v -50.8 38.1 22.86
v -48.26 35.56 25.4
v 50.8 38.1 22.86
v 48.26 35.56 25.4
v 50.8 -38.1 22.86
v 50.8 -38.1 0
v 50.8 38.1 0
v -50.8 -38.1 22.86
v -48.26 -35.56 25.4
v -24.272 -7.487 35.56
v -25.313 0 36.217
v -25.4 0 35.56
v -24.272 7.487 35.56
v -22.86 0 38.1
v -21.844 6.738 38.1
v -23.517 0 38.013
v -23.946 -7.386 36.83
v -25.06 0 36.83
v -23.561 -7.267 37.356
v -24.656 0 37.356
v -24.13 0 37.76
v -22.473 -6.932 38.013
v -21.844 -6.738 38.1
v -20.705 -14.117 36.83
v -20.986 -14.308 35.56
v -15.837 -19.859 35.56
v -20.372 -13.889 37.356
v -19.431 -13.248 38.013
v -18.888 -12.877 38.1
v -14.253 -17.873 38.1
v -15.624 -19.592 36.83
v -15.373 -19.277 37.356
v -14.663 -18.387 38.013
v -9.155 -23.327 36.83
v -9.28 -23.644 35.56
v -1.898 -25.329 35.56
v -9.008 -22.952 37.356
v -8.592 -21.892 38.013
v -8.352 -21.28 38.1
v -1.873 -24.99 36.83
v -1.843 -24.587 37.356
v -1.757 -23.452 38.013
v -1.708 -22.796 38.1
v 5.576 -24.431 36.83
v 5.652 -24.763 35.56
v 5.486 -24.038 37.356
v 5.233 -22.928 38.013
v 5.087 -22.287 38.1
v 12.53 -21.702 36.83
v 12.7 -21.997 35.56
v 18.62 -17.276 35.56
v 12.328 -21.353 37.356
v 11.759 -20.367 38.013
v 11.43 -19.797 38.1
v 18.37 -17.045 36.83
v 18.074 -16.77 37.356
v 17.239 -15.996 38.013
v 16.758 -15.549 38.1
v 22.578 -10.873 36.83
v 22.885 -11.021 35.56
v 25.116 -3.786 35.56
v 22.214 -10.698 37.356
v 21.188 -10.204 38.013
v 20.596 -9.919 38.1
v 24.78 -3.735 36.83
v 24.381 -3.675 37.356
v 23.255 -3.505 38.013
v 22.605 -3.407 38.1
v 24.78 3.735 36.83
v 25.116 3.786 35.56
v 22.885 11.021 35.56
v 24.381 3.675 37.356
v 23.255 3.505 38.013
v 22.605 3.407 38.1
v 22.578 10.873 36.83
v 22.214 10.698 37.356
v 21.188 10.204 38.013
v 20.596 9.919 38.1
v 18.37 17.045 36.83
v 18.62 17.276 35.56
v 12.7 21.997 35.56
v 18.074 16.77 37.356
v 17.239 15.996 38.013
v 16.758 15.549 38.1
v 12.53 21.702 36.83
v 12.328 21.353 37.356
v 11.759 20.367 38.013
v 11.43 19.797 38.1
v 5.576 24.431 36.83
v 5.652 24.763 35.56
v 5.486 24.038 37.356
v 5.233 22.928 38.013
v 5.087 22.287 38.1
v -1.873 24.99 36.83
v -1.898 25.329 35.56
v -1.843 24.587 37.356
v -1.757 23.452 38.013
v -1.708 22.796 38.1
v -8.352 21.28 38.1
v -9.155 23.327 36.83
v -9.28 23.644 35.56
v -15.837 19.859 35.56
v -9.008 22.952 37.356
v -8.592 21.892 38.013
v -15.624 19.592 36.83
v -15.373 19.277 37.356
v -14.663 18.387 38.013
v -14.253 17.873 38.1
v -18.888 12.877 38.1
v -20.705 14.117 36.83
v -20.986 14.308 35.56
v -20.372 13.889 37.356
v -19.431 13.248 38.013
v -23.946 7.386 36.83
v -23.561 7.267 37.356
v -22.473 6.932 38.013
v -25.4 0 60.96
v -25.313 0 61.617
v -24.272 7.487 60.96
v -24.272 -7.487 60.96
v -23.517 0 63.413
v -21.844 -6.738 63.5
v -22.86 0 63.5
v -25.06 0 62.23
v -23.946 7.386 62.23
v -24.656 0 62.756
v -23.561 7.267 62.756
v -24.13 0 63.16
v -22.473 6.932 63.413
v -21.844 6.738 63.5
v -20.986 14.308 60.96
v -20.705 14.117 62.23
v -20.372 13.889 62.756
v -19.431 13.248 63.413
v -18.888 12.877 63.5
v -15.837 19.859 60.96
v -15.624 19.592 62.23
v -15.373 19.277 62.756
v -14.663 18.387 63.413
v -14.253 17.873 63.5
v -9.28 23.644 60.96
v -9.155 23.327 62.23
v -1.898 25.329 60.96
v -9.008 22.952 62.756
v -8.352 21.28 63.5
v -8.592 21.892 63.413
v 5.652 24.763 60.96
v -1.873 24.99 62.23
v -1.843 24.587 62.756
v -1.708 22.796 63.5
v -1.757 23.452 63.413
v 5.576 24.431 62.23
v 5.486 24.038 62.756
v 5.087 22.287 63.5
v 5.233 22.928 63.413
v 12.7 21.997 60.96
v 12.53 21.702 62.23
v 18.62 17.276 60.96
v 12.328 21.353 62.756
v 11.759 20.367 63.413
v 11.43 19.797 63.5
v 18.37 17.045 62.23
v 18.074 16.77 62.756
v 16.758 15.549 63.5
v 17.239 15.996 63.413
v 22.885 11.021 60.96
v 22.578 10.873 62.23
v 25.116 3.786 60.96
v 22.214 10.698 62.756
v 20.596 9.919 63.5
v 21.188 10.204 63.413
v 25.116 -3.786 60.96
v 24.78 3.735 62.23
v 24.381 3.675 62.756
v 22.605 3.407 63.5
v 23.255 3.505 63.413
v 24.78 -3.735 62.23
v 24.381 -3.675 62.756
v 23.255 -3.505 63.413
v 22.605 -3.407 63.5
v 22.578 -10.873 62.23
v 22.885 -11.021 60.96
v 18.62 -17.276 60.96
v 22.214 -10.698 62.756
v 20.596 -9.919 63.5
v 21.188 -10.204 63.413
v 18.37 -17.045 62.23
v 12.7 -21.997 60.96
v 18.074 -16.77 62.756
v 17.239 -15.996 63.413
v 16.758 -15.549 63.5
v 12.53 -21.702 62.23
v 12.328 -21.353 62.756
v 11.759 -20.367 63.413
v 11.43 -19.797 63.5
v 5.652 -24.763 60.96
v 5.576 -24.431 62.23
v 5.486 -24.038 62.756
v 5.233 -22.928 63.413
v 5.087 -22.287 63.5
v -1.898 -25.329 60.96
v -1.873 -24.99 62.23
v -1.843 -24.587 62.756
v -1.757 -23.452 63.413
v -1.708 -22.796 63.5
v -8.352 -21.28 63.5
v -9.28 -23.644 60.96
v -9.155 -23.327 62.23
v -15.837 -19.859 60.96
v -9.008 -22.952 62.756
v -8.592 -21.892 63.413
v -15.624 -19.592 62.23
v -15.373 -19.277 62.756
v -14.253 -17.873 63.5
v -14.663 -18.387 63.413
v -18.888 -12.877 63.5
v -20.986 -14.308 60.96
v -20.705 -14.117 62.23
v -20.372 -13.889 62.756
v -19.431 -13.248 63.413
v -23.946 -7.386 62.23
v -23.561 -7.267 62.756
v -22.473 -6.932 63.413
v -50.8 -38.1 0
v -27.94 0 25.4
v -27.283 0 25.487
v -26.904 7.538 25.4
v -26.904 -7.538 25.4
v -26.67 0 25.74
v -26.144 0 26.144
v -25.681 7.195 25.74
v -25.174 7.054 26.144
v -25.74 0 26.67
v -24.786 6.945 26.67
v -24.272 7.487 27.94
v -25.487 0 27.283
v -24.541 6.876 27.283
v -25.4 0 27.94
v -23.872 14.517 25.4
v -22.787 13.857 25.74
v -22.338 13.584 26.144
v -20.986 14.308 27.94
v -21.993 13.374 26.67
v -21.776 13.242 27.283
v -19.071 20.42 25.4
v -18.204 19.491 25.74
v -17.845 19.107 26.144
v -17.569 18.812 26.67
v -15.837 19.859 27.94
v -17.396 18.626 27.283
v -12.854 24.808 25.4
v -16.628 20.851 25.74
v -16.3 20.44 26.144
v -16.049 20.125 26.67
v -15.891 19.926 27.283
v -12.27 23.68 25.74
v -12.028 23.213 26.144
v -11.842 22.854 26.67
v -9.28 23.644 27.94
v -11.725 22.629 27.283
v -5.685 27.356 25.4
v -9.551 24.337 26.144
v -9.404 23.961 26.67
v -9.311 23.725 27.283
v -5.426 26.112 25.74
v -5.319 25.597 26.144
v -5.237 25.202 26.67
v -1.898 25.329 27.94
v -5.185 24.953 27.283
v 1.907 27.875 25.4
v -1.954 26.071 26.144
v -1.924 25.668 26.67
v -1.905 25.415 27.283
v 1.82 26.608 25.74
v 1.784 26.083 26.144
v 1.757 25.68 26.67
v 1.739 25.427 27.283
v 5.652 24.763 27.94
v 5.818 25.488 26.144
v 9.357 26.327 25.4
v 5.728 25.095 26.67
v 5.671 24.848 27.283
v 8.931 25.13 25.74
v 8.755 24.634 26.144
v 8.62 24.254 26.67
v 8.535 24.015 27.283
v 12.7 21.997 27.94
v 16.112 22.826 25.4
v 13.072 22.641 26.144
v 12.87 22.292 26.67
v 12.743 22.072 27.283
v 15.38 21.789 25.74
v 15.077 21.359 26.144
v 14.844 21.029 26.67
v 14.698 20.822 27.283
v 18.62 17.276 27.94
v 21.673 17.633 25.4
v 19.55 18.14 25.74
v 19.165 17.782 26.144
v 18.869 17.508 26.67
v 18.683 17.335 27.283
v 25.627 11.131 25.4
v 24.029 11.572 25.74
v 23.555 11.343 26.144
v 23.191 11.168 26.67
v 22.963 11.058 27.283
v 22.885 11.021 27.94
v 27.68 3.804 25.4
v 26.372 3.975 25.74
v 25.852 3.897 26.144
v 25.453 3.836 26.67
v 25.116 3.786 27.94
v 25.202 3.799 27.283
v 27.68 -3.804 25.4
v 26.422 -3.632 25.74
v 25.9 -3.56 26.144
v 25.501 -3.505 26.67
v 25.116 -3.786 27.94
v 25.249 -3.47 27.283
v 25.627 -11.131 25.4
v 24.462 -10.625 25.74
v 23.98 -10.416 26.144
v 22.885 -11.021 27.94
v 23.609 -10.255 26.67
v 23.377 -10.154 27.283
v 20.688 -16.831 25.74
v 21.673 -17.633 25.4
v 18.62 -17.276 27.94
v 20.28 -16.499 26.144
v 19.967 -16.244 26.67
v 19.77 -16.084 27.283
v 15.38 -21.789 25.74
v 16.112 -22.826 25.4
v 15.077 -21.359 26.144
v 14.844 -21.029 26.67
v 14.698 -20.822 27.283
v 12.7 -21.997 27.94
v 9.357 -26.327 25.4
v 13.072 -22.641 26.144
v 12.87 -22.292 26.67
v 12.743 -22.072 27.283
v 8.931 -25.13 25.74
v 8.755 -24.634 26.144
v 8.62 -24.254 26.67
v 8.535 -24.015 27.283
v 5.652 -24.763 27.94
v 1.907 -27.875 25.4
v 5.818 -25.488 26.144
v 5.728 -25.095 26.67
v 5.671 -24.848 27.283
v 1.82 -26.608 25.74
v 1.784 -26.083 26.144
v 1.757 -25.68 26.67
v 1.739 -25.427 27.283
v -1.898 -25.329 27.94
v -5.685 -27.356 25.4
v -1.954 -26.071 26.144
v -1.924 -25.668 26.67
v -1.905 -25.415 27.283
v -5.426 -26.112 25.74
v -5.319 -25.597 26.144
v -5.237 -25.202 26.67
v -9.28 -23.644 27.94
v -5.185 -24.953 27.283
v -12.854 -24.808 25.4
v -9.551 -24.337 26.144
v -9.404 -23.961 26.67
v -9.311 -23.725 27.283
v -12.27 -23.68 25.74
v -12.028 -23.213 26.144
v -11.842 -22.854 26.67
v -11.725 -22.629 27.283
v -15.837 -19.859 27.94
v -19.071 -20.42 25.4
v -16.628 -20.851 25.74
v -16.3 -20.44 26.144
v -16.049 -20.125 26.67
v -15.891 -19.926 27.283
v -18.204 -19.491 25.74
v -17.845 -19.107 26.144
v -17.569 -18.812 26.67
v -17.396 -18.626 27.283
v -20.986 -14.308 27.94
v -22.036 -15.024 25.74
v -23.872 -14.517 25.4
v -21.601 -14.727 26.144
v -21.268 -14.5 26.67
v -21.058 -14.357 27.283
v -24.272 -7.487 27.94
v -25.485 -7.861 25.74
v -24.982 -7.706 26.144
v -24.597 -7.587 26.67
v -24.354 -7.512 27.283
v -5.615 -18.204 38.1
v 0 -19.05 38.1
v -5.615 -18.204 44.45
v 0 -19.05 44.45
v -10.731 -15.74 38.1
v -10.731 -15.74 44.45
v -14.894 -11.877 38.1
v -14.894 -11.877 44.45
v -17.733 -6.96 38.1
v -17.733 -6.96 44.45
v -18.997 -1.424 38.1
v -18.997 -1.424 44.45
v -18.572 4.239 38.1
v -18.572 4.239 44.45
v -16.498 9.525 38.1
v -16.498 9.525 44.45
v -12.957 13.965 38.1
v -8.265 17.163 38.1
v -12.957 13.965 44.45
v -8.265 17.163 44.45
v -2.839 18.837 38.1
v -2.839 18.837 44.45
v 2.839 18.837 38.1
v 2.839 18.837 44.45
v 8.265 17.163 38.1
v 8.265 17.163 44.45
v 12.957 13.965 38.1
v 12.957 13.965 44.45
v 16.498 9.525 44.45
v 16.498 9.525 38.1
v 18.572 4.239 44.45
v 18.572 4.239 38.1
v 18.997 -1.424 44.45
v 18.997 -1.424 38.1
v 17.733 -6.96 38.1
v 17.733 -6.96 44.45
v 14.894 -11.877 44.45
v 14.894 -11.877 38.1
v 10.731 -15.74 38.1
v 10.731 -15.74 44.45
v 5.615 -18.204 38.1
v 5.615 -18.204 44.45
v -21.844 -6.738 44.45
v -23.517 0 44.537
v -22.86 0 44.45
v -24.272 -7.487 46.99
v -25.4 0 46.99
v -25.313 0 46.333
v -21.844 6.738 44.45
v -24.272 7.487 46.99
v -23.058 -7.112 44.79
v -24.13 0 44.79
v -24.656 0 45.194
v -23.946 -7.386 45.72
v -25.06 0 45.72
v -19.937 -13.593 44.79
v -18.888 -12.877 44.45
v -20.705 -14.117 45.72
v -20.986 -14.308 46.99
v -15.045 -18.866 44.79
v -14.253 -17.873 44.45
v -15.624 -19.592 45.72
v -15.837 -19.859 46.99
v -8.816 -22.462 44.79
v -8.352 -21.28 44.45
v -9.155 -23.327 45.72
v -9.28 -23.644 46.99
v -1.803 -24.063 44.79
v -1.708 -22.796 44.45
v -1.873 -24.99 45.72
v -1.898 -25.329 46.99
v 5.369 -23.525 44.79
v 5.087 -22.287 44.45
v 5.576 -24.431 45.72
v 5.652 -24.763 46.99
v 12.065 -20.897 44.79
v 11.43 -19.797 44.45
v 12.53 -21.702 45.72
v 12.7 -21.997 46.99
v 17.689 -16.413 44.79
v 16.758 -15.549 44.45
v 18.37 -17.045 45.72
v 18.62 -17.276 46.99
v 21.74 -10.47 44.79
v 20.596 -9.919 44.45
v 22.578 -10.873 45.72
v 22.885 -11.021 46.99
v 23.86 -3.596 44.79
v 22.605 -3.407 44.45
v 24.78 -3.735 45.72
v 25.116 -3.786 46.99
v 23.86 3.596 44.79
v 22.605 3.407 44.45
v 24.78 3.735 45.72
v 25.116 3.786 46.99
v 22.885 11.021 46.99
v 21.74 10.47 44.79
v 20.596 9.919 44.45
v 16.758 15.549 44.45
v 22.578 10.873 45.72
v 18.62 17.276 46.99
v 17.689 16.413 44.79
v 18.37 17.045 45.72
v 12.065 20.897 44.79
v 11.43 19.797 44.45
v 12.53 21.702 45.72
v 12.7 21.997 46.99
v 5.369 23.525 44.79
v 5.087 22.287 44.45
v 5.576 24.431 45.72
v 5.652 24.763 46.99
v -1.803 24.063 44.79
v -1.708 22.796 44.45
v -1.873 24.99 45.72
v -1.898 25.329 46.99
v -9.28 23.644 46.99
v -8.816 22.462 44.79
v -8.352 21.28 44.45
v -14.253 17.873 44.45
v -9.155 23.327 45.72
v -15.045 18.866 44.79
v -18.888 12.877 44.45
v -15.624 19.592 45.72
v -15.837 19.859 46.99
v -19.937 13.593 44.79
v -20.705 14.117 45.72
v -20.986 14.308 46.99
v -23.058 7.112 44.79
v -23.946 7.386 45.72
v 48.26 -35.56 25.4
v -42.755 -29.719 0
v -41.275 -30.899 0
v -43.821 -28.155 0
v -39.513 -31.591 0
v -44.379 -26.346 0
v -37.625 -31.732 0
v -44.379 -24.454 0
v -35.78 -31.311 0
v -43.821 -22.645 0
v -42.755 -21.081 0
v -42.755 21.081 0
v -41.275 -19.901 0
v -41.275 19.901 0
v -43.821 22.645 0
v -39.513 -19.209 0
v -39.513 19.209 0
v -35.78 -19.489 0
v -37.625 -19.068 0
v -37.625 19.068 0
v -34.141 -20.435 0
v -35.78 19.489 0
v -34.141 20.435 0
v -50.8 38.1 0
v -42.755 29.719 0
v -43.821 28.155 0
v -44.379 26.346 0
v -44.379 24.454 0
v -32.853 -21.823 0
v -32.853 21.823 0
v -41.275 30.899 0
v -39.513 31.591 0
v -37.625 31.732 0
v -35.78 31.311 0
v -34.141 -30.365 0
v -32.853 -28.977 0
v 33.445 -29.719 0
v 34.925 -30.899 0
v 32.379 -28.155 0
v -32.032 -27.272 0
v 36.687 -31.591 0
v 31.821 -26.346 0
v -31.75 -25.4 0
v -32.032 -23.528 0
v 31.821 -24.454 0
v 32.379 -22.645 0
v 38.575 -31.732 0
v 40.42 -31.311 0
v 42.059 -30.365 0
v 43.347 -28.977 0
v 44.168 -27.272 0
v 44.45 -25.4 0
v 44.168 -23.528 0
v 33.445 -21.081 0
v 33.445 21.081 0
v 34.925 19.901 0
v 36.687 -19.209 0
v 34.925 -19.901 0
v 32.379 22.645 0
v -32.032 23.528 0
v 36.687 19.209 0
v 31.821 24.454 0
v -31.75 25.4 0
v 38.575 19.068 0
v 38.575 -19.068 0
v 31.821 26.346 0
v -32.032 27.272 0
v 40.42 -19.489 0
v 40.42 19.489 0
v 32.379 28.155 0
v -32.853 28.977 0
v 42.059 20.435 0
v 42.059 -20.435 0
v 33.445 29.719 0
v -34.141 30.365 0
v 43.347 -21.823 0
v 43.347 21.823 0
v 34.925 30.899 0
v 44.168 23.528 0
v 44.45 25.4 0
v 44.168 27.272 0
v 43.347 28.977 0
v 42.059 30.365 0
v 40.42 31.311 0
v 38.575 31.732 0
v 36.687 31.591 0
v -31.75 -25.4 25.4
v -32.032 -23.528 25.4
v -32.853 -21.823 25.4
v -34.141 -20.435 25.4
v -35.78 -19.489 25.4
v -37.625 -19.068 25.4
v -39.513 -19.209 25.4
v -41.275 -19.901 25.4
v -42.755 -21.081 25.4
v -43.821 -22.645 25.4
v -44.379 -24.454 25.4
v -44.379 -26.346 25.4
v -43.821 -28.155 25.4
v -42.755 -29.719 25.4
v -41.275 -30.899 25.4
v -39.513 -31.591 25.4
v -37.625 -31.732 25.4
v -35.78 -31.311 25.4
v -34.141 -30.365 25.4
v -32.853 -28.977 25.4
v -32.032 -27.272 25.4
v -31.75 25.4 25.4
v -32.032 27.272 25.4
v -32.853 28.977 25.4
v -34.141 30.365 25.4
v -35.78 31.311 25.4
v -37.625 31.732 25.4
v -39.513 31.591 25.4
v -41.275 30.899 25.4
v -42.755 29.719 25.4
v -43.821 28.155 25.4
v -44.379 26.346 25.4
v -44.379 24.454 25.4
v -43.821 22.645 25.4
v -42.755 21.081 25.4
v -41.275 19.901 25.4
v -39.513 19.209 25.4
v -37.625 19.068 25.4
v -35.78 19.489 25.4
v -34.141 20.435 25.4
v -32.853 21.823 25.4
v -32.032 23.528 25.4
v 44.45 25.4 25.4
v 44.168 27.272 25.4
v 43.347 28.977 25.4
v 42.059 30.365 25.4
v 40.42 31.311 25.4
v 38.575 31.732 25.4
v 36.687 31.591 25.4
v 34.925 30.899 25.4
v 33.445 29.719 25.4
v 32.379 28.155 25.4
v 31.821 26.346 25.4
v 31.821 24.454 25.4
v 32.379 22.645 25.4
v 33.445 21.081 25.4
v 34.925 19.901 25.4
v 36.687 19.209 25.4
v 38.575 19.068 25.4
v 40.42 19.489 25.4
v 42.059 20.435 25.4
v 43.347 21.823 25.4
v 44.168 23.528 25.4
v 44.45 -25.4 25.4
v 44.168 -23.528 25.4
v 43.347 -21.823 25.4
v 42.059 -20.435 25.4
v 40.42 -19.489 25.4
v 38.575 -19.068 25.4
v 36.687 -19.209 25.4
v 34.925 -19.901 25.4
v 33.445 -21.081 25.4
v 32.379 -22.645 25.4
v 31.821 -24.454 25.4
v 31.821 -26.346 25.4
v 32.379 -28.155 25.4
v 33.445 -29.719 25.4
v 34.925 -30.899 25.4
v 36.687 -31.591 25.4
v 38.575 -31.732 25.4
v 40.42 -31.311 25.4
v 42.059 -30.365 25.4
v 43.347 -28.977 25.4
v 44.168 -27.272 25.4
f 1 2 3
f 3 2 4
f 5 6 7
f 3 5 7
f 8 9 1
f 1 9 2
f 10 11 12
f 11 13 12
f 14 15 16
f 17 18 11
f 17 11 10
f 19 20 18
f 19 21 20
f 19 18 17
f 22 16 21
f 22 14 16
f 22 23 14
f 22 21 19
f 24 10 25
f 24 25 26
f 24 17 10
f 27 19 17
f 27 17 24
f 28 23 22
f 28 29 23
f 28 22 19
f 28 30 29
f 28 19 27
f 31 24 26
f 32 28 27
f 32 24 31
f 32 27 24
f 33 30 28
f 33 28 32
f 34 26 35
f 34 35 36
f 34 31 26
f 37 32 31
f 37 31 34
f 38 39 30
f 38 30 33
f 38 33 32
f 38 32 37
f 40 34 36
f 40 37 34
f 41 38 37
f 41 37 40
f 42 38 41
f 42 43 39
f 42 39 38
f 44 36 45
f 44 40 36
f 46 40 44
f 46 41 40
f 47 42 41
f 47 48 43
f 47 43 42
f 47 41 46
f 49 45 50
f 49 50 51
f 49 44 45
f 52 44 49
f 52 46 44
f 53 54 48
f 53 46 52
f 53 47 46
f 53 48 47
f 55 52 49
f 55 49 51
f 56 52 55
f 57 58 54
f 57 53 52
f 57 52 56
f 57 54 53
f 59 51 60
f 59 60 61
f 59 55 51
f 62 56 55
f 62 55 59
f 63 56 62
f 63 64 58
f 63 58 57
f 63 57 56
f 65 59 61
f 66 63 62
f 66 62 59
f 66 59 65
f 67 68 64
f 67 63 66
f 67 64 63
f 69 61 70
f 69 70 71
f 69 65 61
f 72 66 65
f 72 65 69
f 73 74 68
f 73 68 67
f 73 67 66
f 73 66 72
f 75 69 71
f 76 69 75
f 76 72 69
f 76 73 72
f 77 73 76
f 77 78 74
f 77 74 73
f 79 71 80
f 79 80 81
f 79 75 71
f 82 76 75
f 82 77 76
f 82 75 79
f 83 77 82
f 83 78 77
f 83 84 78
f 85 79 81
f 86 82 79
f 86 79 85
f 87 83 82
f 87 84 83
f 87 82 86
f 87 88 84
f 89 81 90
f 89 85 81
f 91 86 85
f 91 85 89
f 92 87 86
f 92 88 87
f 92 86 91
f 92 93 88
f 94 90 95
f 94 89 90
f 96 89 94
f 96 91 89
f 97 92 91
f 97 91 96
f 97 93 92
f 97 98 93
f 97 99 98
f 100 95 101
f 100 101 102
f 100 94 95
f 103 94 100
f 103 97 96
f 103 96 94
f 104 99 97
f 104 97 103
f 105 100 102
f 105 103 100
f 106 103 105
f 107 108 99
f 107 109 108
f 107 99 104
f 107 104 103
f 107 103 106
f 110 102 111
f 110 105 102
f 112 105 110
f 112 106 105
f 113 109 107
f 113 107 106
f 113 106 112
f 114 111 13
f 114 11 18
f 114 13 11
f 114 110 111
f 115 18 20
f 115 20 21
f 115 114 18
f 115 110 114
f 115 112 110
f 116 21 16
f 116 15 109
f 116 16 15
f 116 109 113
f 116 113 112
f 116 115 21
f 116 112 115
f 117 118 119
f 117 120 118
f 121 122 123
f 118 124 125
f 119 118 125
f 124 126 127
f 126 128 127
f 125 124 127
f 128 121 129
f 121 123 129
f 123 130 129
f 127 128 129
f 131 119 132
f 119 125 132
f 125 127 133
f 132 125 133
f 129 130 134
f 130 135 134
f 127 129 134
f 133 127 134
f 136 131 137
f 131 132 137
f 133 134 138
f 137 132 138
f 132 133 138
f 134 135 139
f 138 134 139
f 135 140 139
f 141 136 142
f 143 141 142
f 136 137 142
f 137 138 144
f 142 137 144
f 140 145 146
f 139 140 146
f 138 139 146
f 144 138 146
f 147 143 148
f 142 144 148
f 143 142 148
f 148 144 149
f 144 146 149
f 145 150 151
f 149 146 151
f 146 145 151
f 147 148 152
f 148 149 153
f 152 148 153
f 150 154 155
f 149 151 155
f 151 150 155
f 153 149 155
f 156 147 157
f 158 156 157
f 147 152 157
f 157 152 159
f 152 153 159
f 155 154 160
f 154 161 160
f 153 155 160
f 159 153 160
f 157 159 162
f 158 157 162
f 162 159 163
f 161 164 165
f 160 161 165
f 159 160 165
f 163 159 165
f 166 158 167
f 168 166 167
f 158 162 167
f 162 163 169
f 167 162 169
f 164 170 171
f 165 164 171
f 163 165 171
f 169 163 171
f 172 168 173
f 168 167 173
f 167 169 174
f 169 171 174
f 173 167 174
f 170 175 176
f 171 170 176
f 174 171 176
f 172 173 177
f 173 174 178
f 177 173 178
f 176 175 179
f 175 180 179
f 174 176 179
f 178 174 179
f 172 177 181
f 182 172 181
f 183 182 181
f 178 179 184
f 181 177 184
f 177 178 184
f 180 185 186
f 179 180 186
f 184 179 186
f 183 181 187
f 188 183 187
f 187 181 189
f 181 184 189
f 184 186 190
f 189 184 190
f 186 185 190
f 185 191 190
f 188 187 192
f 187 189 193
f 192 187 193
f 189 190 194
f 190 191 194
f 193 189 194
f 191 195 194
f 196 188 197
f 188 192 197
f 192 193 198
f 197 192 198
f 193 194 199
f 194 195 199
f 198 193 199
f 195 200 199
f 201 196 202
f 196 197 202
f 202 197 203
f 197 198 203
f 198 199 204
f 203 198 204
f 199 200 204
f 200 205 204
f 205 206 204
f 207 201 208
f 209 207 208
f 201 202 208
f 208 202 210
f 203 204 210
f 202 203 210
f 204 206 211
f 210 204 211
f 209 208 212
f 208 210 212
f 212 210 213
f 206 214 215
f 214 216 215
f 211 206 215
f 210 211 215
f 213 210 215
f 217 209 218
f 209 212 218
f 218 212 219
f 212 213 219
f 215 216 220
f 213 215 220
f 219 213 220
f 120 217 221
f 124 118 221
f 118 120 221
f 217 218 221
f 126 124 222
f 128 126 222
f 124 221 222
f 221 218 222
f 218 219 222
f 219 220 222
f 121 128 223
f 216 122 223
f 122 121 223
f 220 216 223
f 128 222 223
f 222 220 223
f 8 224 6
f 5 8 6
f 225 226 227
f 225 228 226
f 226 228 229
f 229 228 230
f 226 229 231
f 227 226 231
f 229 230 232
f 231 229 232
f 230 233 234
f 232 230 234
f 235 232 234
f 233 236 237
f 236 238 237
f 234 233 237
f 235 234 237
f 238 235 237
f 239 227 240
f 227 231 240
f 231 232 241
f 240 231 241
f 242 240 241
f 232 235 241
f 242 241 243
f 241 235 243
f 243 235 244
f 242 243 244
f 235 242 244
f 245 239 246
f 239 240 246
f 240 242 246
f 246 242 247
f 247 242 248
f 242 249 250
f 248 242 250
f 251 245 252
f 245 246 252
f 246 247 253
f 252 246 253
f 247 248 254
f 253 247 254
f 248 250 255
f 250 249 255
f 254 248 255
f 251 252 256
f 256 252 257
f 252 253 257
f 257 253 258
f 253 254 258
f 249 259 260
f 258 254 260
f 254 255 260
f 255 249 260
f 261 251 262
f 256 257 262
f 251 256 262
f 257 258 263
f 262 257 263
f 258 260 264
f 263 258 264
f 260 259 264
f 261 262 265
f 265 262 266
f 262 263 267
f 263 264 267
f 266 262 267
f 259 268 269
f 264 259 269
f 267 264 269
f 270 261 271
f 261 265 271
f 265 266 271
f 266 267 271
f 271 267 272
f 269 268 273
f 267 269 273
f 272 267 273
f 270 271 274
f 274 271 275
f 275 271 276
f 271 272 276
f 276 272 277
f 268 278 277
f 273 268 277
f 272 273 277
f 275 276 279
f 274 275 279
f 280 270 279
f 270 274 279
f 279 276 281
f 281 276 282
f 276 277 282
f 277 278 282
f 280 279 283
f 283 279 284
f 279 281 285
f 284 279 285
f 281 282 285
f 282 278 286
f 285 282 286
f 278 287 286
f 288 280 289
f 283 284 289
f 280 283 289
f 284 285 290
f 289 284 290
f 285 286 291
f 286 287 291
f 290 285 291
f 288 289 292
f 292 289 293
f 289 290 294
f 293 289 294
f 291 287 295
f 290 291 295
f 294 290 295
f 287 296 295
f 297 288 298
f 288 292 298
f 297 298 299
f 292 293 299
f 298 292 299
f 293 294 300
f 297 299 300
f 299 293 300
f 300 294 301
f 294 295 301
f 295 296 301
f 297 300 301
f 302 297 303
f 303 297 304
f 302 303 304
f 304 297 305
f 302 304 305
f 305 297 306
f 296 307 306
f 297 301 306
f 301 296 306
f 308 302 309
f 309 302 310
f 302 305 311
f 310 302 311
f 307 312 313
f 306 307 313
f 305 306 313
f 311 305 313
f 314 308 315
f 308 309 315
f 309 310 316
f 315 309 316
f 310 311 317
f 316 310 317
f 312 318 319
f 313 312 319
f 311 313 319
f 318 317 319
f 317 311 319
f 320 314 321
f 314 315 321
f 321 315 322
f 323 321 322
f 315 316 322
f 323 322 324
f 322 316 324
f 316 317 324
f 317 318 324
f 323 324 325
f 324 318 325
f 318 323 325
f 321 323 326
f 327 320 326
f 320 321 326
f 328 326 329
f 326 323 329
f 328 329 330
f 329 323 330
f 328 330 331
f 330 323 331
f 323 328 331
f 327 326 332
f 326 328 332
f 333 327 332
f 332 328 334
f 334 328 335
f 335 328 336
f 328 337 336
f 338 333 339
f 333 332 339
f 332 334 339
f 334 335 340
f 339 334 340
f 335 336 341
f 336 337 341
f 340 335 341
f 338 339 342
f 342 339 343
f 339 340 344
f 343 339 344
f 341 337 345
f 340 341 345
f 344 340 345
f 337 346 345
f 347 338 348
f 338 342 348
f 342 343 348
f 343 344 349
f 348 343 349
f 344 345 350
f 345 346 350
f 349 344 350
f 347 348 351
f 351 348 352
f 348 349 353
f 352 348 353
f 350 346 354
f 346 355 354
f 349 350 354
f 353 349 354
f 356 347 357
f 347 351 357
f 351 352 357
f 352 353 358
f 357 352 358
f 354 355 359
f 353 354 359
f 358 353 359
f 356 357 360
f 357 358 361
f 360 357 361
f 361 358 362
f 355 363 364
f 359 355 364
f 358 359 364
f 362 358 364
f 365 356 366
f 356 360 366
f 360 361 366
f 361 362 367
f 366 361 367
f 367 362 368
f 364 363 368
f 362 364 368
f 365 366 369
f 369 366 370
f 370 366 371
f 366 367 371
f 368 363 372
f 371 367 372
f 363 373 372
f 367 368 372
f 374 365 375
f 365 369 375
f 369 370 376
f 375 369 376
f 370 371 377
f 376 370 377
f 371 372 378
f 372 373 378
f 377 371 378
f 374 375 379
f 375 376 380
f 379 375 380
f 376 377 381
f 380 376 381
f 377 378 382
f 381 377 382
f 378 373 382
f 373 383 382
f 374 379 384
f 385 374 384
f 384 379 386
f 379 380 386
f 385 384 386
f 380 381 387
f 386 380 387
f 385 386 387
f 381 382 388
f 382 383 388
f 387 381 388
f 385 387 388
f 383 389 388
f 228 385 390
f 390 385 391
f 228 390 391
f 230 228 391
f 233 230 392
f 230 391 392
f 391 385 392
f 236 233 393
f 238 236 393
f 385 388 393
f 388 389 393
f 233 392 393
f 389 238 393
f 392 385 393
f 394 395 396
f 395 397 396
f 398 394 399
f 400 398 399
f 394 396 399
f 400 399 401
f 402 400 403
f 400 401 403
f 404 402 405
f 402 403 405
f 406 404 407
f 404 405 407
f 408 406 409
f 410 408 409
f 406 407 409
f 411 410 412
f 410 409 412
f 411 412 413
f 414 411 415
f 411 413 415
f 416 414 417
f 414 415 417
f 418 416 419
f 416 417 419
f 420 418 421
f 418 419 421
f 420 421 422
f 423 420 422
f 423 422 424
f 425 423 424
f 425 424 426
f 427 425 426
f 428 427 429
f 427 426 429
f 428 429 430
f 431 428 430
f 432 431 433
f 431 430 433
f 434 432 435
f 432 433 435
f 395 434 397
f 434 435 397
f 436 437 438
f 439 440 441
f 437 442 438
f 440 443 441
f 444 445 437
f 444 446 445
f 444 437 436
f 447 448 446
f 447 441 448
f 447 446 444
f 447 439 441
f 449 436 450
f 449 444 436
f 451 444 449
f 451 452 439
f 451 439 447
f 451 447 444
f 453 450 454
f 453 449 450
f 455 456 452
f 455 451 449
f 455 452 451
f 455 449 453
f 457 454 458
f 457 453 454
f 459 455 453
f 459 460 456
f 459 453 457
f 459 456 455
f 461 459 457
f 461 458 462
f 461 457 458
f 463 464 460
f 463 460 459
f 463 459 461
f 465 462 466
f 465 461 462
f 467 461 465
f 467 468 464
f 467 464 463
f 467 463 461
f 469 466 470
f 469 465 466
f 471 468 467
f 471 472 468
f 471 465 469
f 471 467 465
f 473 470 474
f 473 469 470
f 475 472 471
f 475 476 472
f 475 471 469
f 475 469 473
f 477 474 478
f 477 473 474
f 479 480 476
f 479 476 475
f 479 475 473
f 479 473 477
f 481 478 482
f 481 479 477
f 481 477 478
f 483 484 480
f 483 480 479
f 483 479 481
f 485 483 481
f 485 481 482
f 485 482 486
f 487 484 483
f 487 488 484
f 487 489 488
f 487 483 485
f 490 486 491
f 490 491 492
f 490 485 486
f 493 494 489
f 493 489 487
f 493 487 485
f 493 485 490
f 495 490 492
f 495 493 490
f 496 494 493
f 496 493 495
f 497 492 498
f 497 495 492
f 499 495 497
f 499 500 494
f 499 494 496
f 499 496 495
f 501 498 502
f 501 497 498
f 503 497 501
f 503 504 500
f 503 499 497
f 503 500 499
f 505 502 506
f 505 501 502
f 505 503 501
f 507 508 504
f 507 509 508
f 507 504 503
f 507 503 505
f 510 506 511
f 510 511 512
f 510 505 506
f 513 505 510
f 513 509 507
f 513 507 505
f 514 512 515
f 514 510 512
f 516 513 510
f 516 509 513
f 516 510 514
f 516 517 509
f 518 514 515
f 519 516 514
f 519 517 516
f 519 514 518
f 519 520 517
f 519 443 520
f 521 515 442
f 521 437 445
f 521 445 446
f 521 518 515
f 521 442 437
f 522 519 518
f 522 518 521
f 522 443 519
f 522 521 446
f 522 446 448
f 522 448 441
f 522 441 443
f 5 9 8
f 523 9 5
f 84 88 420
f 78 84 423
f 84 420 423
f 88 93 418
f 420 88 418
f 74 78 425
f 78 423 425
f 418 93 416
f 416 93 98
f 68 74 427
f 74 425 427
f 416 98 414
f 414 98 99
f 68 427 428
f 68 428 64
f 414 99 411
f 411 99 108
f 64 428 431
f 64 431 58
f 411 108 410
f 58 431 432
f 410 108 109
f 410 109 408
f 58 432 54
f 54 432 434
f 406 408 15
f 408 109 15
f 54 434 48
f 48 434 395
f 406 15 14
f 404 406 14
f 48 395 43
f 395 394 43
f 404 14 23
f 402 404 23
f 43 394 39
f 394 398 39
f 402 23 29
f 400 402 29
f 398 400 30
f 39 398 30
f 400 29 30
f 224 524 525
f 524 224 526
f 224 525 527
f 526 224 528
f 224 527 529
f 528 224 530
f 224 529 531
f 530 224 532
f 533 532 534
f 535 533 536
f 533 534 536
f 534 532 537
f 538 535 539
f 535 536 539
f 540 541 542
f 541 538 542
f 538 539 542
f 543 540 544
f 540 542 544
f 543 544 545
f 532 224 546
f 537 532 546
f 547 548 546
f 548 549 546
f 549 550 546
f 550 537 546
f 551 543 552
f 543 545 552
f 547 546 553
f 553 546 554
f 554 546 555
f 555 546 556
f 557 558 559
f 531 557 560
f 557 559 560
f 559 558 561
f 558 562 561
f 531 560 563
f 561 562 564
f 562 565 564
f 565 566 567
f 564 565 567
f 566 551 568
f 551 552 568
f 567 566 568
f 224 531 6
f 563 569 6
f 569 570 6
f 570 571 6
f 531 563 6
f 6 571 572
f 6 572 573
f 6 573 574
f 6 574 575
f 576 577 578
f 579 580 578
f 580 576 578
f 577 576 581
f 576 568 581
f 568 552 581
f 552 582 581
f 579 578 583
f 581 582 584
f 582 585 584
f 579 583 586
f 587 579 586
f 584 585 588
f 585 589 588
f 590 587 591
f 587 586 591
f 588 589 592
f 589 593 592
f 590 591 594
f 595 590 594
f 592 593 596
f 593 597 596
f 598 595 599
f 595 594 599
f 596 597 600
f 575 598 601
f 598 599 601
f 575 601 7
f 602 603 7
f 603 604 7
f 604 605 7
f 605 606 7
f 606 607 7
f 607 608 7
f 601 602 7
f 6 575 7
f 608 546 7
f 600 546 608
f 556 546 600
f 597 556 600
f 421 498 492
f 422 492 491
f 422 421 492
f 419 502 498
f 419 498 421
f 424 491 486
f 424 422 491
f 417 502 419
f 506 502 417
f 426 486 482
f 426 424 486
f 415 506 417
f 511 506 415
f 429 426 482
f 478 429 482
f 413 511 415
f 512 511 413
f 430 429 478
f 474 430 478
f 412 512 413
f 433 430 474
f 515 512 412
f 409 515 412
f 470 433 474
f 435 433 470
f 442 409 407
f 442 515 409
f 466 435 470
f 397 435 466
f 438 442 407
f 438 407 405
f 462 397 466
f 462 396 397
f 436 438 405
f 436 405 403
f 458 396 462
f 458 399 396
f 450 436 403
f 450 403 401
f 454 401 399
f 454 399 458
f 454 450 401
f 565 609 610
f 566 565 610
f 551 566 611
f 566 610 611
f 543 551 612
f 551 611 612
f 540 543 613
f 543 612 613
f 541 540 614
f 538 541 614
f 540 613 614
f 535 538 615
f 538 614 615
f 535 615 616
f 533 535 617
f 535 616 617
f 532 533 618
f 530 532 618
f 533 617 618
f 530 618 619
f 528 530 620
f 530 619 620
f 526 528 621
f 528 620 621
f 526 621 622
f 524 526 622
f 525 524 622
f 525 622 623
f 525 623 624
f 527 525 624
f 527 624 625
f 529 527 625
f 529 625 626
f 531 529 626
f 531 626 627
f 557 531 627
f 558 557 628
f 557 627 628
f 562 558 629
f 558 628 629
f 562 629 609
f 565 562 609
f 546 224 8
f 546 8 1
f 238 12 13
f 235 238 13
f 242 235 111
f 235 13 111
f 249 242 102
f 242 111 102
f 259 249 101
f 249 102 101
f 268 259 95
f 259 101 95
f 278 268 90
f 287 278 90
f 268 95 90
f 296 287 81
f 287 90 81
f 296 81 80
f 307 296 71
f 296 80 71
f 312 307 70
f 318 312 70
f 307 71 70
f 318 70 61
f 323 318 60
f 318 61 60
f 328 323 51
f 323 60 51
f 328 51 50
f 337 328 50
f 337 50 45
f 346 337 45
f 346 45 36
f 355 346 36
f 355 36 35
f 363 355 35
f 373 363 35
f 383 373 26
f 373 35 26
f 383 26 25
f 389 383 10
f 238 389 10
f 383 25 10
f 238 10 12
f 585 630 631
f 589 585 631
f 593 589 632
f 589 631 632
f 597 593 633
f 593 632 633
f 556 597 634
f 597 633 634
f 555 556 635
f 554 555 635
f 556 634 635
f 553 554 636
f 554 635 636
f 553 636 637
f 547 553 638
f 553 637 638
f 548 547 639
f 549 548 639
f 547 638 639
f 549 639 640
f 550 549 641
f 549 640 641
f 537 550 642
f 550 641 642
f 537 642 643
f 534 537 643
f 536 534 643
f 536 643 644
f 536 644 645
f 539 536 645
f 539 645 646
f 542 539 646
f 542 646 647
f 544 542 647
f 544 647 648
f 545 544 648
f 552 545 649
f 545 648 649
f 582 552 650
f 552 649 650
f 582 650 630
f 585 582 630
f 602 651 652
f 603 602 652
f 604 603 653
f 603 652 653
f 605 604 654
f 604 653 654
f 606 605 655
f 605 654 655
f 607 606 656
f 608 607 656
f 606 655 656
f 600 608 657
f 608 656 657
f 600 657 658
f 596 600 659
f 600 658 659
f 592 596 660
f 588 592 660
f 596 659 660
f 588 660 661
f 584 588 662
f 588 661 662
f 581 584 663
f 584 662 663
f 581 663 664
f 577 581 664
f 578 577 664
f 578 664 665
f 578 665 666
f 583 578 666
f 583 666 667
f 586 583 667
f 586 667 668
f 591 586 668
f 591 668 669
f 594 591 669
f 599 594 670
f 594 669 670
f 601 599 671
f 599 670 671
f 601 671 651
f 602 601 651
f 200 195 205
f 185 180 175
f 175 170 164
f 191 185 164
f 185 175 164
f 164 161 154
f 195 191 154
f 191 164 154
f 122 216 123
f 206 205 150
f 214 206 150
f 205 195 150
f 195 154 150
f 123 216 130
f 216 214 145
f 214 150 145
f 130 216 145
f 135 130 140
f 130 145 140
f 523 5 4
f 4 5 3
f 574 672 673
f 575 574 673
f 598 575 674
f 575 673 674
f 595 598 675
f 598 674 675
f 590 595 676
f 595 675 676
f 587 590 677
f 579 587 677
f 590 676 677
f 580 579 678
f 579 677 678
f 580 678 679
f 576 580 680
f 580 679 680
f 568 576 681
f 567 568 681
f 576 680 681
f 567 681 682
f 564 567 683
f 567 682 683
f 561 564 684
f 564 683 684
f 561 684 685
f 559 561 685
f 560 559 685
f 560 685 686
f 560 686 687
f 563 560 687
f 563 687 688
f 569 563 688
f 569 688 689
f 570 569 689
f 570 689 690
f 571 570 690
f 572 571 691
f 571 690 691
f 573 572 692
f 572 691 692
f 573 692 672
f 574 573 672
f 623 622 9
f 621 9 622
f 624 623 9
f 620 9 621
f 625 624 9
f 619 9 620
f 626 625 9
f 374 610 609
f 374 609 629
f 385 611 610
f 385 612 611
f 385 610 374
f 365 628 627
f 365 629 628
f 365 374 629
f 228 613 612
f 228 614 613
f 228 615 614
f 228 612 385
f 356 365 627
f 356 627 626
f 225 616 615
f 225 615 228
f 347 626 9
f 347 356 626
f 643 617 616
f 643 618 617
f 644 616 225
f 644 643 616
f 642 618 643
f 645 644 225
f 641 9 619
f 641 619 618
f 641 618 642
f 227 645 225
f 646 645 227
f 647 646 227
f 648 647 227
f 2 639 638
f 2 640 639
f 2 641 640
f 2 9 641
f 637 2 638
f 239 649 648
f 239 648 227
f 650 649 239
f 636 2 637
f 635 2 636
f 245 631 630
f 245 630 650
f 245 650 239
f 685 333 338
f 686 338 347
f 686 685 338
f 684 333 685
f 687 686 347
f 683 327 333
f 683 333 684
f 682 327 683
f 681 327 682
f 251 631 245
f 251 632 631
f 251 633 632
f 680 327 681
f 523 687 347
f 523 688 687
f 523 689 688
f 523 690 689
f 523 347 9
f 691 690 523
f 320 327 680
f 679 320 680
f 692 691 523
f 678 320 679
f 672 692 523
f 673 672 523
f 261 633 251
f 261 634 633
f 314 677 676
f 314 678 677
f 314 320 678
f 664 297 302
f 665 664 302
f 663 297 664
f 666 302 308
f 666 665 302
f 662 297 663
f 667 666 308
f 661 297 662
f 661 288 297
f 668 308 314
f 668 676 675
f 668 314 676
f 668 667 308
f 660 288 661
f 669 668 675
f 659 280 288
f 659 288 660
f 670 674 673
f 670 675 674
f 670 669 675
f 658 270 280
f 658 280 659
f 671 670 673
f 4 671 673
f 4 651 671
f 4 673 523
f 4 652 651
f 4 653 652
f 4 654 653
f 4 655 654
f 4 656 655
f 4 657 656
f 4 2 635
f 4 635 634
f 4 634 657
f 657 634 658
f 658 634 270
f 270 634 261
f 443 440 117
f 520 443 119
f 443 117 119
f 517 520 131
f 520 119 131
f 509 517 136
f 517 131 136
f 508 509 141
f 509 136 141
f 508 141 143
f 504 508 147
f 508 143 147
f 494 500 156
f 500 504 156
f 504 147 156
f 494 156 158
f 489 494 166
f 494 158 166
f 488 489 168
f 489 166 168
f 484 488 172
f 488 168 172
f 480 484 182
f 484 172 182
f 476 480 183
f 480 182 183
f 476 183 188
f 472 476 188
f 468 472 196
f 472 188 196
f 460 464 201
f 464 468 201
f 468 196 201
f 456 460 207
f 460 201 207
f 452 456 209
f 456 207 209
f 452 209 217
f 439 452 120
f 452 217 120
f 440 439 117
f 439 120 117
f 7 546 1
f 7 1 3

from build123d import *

# Parameters (mm, degrees)
F0_W     = 101.6
F0_H     = 76.2
F1_DEPTH = 25.4
F2_R     = 6.35
F3_DEPTH = 25.4
F4_W     = 25.4
F4_H     = 38.1
F6_W     = 25.4
F6_H     = 6.35
F8_SIZE  = 2.54
F9_R     = 2.54


with BuildPart() as f1:
    # F0 (on Top) → F1 (new body)
    with BuildSketch(Plane.XY):
        Rectangle(F0_W, F0_H)
    extrude(amount=F1_DEPTH)

    # F2 (on face) → F3 (cut)
    with BuildSketch(Plane.XY.offset(25.4)):
        with Locations((-38.1, 25.4)):
            Circle(F2_R)
        with Locations((38.1, 25.4)):
            Circle(F2_R)
        with Locations((38.1, -25.4)):
            Circle(F2_R)
        with Locations((-38.1, -25.4)):
            Circle(F2_R)
    extrude(amount=-F3_DEPTH, mode=Mode.SUBTRACT)

    # F4 (on Front) → F5 (revolve)
    with BuildSketch(Plane.XZ):
        with Locations((-12.7, 44.45)):
            Rectangle(F4_W, F4_H)
    revolve(axis=Axis((0, 0, 44.45), (0, 0, -1)))

    # F6 (on Right) → F7 (revolve, cut)
    with BuildSketch(Plane.YZ):
        with Locations((-31.75, 41.275)):
            Rectangle(F6_W, F6_H)
    revolve(axis=Axis((0, 0, 63.5), (0, 0, -1)), mode=Mode.SUBTRACT)

    # F8
    f8_edges = [f1.edges().sort_by_distance(p)[0] for p in [
        (0, 38.1, 25.4),
        (-50.8, 0, 25.4),
        (0, -38.1, 25.4),
        (50.8, 0, 25.4),
    ]]
    chamfer(f8_edges, length=F8_SIZE)

    # F9
    f9_edges = [f1.edges().sort_by_distance(p)[0] for p in [
        (25.4, 0, 25.4),
        (25.4, 0, 38.1),
        (25.4, 0, 44.45),
        (25.4, 0, 63.5),
    ]]
    fillet(f9_edges, radius=F9_R)


solid = f1.part
